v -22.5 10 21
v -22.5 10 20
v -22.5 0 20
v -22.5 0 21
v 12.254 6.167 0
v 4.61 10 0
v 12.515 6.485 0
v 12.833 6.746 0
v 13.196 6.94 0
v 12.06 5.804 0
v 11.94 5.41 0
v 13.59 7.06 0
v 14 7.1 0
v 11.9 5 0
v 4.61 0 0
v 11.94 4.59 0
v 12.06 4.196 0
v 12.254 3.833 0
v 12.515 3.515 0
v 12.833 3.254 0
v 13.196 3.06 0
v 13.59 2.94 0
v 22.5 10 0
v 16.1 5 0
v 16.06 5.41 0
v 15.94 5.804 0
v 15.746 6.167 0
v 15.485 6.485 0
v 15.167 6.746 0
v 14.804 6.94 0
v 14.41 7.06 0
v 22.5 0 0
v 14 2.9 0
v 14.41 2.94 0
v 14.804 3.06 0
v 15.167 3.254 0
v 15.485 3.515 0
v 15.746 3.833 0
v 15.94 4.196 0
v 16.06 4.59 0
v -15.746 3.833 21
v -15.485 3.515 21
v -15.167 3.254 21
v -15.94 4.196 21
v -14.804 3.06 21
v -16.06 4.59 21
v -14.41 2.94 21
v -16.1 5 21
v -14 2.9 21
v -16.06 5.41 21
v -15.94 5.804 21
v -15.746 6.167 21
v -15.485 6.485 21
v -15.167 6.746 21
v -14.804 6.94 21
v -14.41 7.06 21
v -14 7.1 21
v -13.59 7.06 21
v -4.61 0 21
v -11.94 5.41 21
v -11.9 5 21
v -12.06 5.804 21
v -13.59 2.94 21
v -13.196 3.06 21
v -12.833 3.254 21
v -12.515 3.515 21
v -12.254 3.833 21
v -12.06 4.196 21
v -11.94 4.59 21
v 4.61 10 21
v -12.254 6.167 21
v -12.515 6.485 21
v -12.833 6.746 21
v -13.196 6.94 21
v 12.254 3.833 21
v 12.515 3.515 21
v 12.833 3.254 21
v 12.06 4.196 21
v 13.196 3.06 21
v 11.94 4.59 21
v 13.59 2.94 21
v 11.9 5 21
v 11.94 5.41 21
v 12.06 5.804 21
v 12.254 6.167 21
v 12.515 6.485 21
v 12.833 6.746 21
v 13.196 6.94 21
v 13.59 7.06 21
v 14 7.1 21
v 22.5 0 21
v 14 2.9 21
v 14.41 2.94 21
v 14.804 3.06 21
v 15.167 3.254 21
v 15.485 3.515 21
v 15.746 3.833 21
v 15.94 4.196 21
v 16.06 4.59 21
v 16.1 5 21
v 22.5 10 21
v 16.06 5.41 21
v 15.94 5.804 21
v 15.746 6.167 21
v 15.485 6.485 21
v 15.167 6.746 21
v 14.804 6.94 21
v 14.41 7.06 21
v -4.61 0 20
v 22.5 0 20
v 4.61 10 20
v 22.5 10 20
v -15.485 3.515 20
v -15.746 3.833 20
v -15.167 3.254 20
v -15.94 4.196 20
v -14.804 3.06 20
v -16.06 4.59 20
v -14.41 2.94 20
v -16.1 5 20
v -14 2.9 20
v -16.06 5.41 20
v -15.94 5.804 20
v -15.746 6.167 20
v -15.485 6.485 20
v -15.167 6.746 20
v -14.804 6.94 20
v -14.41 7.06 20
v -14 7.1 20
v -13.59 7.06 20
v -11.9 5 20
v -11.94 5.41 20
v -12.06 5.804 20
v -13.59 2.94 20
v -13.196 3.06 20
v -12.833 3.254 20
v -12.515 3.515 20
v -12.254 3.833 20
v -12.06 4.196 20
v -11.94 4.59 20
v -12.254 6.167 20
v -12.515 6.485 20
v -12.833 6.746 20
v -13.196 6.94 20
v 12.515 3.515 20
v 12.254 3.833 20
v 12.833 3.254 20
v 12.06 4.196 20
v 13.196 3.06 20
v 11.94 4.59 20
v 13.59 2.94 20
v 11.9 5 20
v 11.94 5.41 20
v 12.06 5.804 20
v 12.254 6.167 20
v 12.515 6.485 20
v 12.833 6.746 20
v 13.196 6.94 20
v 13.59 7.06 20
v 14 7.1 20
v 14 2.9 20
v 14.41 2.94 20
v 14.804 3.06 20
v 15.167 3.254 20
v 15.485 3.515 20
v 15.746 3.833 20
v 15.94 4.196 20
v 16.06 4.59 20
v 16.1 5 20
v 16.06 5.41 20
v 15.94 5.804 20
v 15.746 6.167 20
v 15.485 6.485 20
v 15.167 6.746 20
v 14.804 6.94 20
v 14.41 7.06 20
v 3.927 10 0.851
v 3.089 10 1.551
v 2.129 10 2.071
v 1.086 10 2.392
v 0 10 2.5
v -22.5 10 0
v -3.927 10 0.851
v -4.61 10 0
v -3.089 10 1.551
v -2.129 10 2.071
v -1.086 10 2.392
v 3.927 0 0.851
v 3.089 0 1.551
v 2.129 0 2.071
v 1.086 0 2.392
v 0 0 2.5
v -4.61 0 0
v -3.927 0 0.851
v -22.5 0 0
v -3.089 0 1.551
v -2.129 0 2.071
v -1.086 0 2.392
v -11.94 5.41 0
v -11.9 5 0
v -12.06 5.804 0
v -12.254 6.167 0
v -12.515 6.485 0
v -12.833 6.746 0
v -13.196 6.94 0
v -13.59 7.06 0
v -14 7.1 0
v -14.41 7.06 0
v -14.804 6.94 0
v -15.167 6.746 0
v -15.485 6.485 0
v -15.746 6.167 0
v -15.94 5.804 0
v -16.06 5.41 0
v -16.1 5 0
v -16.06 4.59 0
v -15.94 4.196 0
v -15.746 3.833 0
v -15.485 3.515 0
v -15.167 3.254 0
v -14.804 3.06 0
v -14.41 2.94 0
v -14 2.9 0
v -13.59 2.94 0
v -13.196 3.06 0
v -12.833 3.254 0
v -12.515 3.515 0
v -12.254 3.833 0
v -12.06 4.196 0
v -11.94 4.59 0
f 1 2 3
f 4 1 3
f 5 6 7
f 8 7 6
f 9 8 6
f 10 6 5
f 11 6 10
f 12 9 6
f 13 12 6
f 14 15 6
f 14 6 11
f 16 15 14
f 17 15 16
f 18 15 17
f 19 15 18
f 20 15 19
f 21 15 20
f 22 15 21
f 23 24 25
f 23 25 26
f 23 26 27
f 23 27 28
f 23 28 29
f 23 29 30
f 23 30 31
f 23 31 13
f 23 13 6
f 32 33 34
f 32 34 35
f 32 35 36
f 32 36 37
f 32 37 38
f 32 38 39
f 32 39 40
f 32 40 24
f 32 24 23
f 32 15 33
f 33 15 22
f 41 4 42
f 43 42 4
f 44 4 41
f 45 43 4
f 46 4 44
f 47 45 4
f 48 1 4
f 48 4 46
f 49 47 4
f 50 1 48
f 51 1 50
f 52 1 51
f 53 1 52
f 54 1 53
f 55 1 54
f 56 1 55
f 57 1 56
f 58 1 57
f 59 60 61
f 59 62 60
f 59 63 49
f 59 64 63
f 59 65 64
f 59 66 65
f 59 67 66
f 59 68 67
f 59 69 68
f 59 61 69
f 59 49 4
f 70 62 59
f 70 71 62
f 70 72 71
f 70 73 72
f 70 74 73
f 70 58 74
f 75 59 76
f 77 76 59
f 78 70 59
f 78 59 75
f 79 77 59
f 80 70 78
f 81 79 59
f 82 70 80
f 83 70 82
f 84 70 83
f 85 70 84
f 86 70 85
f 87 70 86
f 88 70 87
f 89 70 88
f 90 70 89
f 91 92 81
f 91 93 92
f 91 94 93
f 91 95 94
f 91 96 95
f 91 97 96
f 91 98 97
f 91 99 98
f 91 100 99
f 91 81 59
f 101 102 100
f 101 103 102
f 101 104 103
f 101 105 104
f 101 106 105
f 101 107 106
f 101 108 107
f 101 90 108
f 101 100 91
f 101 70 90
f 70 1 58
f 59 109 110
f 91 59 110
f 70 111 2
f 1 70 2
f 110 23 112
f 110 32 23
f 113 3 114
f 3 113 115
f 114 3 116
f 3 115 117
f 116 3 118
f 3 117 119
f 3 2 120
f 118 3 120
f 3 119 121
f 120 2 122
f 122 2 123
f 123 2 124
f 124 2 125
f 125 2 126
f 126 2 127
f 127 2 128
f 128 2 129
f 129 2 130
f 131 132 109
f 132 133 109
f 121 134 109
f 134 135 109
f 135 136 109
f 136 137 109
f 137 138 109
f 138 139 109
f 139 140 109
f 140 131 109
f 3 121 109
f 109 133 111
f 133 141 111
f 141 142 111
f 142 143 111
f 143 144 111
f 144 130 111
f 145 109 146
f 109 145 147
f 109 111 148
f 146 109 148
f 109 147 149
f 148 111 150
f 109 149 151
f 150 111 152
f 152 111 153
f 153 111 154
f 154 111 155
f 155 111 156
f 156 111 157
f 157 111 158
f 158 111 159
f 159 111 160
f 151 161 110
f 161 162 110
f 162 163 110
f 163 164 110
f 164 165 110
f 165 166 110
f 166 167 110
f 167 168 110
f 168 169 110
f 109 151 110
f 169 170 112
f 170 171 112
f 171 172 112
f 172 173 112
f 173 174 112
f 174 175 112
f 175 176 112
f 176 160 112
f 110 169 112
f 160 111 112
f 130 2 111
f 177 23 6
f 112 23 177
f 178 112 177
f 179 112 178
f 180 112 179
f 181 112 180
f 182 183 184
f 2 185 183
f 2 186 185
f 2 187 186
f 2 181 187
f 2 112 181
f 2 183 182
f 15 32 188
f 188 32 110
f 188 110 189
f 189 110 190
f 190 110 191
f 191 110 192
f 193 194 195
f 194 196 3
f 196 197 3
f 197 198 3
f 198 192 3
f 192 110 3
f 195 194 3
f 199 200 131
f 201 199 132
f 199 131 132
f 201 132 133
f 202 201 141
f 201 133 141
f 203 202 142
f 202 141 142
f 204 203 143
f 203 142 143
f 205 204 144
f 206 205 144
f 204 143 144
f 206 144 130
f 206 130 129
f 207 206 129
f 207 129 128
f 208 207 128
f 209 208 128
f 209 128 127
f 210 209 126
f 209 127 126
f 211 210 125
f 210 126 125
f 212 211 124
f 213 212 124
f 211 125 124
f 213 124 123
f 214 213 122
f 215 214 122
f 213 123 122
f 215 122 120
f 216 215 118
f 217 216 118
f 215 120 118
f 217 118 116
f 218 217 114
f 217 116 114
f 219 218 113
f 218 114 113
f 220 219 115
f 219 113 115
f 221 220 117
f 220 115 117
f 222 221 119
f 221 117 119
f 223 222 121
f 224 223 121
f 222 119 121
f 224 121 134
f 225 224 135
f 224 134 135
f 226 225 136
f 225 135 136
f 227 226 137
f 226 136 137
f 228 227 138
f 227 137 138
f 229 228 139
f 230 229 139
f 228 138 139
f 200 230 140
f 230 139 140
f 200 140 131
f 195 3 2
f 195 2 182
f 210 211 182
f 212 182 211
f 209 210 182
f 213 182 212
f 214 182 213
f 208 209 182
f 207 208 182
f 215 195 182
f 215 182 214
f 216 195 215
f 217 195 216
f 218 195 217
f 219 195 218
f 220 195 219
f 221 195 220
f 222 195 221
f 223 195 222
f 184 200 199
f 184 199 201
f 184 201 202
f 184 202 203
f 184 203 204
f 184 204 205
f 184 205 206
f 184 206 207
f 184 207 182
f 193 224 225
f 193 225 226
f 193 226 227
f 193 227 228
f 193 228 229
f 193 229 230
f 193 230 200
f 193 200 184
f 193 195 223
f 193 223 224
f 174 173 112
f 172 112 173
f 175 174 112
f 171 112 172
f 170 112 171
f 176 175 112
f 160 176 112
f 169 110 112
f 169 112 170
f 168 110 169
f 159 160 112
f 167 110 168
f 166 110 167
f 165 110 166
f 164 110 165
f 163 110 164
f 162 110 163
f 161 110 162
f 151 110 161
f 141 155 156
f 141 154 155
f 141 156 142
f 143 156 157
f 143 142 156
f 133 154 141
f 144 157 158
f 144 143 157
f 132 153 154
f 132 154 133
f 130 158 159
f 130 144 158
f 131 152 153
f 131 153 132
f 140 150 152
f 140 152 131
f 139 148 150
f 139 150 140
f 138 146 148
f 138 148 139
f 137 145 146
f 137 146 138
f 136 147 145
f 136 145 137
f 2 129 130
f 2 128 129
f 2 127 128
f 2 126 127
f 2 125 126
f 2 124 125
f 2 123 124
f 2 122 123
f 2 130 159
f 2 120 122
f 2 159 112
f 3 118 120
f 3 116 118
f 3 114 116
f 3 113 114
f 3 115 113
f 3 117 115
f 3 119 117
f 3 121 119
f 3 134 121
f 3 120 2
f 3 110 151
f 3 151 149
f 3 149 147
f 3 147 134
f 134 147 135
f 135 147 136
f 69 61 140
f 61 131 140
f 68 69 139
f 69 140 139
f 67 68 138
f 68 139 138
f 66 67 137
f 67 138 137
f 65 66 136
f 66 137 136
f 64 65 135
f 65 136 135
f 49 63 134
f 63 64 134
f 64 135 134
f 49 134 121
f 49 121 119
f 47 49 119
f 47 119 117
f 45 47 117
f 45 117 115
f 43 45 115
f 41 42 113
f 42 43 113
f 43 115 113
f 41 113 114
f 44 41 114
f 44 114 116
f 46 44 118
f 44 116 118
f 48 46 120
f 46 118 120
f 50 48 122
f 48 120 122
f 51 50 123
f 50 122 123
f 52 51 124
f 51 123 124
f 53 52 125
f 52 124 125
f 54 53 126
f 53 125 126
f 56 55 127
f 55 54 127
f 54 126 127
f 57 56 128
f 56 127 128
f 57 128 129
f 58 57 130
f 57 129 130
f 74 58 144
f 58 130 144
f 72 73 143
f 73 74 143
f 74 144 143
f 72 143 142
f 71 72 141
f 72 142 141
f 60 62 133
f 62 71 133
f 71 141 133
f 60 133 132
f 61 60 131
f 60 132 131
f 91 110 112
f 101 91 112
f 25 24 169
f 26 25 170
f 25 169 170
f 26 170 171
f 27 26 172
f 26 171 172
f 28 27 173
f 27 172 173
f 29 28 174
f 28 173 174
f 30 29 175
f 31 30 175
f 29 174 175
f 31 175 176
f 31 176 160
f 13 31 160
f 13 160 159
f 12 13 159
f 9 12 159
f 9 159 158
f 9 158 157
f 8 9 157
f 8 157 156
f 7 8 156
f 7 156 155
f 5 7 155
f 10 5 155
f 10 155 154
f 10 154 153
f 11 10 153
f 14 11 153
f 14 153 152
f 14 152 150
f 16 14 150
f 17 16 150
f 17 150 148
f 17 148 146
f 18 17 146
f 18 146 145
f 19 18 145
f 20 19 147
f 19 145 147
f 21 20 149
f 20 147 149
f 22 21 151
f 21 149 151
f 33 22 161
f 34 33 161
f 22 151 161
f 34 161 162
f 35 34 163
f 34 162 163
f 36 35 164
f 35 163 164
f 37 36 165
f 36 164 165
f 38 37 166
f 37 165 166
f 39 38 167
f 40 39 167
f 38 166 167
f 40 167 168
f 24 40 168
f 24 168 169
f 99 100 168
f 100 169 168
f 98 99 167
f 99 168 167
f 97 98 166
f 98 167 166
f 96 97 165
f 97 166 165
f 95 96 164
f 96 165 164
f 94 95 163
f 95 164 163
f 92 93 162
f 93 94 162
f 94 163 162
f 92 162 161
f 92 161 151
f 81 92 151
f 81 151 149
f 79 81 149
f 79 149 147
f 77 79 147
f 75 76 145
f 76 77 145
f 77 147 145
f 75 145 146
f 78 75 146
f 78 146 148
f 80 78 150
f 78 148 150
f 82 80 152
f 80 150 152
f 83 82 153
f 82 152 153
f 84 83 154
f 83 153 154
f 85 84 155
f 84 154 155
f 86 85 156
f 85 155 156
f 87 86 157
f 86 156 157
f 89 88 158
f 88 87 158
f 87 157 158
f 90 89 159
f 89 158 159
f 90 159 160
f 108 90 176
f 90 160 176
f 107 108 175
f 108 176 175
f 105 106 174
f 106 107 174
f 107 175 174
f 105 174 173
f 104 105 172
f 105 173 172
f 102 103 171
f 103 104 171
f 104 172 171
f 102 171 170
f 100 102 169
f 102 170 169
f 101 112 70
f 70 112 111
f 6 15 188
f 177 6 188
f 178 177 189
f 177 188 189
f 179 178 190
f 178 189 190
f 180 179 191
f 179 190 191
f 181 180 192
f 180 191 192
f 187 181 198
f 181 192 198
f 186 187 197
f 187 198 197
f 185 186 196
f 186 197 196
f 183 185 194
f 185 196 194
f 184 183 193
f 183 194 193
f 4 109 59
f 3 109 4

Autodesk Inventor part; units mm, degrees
ref_plane "YZ Plane" through (0, 0, 0) normal (1, 0, 0) x (0, 1, 0)
ref_plane "XZ Plane" through (0, 0, 0) normal (0, 1, 0) x (-1, 0, 0)
ref_plane "XY Plane" through (0, 0, 0) normal (0, 0, 1) x (1, 0, 0)
sketch "Sketch1" plane through (0, 0, 0) normal (0, 1, 0) x (-1, 0, 0)
  line L0 (22.5, 0) -> (-22.5, 0)
  line L1 (-22.5, 0) -> (-22.5, 20)
  line L2 (-22.5, 20) -> (22.5, 20)
  line L3 (22.5, 20) -> (22.5, 0)
  arc A0 (4.6098, 0) -> (-4.6098, 0) centre (0, -3) ccw
  point P0 (0, 0)
  point P1 (0, 0)
  dimension "d0" = 45
  dimension "d1" = 20
  dimension "d2" = 5.5
  dimension "d3" = 3
extrude "Extrusion1" add sketch "Sketch1" along normal blind 10 contours L0 A0 L1 L2 L3
sketch "Sketch2" plane through (-22.5, 0, 20) normal (0, 0, 1) x (1, 0, 0)
  circle A0 centre (8.5, 5) radius 2.1
  line L0 (22.5, 0) -> (22.5, 4.9707)
  circle A1 centre (36.5, 5) radius 2.1
  line L1 (0, 0) -> (0, 10) projected
  line L2 (0, 0) -> (45, 0) projected
  dimension "d6" = 4.2
  dimension "d7" = 8.5
  dimension "d8" = 5
extrude "Extrusion2" cut sketch "Sketch2" against normal through all
sketch "Sketch3" plane through (-22.5, 0, 20) normal (0, 0, 1) x (1, 0, 0)
  line L0 (17.8902, 0) -> (0, 0) projected
  line L1 (45, 10) -> (27.1098, 10) projected
  line L2 (0, 0) -> (45, 0)
  line L3 (45, 0) -> (45, 10)
  line L4 (45, 10) -> (0, 10)
  line L5 (0, 10) -> (0, 0)
  circle A0 centre (8.5, 5) radius 2.1 projected
  circle A1 centre (8.5, 5) radius 2.1
  circle A2 centre (36.5, 5) radius 2.1 projected
  circle A3 centre (36.5, 5) radius 2.1
  point P0 (22.5, 0)
extrude "Extrusion3" add sketch "Sketch3" along normal blind 1 separate body
properties part number "hull_rudder_tube_clamp"
